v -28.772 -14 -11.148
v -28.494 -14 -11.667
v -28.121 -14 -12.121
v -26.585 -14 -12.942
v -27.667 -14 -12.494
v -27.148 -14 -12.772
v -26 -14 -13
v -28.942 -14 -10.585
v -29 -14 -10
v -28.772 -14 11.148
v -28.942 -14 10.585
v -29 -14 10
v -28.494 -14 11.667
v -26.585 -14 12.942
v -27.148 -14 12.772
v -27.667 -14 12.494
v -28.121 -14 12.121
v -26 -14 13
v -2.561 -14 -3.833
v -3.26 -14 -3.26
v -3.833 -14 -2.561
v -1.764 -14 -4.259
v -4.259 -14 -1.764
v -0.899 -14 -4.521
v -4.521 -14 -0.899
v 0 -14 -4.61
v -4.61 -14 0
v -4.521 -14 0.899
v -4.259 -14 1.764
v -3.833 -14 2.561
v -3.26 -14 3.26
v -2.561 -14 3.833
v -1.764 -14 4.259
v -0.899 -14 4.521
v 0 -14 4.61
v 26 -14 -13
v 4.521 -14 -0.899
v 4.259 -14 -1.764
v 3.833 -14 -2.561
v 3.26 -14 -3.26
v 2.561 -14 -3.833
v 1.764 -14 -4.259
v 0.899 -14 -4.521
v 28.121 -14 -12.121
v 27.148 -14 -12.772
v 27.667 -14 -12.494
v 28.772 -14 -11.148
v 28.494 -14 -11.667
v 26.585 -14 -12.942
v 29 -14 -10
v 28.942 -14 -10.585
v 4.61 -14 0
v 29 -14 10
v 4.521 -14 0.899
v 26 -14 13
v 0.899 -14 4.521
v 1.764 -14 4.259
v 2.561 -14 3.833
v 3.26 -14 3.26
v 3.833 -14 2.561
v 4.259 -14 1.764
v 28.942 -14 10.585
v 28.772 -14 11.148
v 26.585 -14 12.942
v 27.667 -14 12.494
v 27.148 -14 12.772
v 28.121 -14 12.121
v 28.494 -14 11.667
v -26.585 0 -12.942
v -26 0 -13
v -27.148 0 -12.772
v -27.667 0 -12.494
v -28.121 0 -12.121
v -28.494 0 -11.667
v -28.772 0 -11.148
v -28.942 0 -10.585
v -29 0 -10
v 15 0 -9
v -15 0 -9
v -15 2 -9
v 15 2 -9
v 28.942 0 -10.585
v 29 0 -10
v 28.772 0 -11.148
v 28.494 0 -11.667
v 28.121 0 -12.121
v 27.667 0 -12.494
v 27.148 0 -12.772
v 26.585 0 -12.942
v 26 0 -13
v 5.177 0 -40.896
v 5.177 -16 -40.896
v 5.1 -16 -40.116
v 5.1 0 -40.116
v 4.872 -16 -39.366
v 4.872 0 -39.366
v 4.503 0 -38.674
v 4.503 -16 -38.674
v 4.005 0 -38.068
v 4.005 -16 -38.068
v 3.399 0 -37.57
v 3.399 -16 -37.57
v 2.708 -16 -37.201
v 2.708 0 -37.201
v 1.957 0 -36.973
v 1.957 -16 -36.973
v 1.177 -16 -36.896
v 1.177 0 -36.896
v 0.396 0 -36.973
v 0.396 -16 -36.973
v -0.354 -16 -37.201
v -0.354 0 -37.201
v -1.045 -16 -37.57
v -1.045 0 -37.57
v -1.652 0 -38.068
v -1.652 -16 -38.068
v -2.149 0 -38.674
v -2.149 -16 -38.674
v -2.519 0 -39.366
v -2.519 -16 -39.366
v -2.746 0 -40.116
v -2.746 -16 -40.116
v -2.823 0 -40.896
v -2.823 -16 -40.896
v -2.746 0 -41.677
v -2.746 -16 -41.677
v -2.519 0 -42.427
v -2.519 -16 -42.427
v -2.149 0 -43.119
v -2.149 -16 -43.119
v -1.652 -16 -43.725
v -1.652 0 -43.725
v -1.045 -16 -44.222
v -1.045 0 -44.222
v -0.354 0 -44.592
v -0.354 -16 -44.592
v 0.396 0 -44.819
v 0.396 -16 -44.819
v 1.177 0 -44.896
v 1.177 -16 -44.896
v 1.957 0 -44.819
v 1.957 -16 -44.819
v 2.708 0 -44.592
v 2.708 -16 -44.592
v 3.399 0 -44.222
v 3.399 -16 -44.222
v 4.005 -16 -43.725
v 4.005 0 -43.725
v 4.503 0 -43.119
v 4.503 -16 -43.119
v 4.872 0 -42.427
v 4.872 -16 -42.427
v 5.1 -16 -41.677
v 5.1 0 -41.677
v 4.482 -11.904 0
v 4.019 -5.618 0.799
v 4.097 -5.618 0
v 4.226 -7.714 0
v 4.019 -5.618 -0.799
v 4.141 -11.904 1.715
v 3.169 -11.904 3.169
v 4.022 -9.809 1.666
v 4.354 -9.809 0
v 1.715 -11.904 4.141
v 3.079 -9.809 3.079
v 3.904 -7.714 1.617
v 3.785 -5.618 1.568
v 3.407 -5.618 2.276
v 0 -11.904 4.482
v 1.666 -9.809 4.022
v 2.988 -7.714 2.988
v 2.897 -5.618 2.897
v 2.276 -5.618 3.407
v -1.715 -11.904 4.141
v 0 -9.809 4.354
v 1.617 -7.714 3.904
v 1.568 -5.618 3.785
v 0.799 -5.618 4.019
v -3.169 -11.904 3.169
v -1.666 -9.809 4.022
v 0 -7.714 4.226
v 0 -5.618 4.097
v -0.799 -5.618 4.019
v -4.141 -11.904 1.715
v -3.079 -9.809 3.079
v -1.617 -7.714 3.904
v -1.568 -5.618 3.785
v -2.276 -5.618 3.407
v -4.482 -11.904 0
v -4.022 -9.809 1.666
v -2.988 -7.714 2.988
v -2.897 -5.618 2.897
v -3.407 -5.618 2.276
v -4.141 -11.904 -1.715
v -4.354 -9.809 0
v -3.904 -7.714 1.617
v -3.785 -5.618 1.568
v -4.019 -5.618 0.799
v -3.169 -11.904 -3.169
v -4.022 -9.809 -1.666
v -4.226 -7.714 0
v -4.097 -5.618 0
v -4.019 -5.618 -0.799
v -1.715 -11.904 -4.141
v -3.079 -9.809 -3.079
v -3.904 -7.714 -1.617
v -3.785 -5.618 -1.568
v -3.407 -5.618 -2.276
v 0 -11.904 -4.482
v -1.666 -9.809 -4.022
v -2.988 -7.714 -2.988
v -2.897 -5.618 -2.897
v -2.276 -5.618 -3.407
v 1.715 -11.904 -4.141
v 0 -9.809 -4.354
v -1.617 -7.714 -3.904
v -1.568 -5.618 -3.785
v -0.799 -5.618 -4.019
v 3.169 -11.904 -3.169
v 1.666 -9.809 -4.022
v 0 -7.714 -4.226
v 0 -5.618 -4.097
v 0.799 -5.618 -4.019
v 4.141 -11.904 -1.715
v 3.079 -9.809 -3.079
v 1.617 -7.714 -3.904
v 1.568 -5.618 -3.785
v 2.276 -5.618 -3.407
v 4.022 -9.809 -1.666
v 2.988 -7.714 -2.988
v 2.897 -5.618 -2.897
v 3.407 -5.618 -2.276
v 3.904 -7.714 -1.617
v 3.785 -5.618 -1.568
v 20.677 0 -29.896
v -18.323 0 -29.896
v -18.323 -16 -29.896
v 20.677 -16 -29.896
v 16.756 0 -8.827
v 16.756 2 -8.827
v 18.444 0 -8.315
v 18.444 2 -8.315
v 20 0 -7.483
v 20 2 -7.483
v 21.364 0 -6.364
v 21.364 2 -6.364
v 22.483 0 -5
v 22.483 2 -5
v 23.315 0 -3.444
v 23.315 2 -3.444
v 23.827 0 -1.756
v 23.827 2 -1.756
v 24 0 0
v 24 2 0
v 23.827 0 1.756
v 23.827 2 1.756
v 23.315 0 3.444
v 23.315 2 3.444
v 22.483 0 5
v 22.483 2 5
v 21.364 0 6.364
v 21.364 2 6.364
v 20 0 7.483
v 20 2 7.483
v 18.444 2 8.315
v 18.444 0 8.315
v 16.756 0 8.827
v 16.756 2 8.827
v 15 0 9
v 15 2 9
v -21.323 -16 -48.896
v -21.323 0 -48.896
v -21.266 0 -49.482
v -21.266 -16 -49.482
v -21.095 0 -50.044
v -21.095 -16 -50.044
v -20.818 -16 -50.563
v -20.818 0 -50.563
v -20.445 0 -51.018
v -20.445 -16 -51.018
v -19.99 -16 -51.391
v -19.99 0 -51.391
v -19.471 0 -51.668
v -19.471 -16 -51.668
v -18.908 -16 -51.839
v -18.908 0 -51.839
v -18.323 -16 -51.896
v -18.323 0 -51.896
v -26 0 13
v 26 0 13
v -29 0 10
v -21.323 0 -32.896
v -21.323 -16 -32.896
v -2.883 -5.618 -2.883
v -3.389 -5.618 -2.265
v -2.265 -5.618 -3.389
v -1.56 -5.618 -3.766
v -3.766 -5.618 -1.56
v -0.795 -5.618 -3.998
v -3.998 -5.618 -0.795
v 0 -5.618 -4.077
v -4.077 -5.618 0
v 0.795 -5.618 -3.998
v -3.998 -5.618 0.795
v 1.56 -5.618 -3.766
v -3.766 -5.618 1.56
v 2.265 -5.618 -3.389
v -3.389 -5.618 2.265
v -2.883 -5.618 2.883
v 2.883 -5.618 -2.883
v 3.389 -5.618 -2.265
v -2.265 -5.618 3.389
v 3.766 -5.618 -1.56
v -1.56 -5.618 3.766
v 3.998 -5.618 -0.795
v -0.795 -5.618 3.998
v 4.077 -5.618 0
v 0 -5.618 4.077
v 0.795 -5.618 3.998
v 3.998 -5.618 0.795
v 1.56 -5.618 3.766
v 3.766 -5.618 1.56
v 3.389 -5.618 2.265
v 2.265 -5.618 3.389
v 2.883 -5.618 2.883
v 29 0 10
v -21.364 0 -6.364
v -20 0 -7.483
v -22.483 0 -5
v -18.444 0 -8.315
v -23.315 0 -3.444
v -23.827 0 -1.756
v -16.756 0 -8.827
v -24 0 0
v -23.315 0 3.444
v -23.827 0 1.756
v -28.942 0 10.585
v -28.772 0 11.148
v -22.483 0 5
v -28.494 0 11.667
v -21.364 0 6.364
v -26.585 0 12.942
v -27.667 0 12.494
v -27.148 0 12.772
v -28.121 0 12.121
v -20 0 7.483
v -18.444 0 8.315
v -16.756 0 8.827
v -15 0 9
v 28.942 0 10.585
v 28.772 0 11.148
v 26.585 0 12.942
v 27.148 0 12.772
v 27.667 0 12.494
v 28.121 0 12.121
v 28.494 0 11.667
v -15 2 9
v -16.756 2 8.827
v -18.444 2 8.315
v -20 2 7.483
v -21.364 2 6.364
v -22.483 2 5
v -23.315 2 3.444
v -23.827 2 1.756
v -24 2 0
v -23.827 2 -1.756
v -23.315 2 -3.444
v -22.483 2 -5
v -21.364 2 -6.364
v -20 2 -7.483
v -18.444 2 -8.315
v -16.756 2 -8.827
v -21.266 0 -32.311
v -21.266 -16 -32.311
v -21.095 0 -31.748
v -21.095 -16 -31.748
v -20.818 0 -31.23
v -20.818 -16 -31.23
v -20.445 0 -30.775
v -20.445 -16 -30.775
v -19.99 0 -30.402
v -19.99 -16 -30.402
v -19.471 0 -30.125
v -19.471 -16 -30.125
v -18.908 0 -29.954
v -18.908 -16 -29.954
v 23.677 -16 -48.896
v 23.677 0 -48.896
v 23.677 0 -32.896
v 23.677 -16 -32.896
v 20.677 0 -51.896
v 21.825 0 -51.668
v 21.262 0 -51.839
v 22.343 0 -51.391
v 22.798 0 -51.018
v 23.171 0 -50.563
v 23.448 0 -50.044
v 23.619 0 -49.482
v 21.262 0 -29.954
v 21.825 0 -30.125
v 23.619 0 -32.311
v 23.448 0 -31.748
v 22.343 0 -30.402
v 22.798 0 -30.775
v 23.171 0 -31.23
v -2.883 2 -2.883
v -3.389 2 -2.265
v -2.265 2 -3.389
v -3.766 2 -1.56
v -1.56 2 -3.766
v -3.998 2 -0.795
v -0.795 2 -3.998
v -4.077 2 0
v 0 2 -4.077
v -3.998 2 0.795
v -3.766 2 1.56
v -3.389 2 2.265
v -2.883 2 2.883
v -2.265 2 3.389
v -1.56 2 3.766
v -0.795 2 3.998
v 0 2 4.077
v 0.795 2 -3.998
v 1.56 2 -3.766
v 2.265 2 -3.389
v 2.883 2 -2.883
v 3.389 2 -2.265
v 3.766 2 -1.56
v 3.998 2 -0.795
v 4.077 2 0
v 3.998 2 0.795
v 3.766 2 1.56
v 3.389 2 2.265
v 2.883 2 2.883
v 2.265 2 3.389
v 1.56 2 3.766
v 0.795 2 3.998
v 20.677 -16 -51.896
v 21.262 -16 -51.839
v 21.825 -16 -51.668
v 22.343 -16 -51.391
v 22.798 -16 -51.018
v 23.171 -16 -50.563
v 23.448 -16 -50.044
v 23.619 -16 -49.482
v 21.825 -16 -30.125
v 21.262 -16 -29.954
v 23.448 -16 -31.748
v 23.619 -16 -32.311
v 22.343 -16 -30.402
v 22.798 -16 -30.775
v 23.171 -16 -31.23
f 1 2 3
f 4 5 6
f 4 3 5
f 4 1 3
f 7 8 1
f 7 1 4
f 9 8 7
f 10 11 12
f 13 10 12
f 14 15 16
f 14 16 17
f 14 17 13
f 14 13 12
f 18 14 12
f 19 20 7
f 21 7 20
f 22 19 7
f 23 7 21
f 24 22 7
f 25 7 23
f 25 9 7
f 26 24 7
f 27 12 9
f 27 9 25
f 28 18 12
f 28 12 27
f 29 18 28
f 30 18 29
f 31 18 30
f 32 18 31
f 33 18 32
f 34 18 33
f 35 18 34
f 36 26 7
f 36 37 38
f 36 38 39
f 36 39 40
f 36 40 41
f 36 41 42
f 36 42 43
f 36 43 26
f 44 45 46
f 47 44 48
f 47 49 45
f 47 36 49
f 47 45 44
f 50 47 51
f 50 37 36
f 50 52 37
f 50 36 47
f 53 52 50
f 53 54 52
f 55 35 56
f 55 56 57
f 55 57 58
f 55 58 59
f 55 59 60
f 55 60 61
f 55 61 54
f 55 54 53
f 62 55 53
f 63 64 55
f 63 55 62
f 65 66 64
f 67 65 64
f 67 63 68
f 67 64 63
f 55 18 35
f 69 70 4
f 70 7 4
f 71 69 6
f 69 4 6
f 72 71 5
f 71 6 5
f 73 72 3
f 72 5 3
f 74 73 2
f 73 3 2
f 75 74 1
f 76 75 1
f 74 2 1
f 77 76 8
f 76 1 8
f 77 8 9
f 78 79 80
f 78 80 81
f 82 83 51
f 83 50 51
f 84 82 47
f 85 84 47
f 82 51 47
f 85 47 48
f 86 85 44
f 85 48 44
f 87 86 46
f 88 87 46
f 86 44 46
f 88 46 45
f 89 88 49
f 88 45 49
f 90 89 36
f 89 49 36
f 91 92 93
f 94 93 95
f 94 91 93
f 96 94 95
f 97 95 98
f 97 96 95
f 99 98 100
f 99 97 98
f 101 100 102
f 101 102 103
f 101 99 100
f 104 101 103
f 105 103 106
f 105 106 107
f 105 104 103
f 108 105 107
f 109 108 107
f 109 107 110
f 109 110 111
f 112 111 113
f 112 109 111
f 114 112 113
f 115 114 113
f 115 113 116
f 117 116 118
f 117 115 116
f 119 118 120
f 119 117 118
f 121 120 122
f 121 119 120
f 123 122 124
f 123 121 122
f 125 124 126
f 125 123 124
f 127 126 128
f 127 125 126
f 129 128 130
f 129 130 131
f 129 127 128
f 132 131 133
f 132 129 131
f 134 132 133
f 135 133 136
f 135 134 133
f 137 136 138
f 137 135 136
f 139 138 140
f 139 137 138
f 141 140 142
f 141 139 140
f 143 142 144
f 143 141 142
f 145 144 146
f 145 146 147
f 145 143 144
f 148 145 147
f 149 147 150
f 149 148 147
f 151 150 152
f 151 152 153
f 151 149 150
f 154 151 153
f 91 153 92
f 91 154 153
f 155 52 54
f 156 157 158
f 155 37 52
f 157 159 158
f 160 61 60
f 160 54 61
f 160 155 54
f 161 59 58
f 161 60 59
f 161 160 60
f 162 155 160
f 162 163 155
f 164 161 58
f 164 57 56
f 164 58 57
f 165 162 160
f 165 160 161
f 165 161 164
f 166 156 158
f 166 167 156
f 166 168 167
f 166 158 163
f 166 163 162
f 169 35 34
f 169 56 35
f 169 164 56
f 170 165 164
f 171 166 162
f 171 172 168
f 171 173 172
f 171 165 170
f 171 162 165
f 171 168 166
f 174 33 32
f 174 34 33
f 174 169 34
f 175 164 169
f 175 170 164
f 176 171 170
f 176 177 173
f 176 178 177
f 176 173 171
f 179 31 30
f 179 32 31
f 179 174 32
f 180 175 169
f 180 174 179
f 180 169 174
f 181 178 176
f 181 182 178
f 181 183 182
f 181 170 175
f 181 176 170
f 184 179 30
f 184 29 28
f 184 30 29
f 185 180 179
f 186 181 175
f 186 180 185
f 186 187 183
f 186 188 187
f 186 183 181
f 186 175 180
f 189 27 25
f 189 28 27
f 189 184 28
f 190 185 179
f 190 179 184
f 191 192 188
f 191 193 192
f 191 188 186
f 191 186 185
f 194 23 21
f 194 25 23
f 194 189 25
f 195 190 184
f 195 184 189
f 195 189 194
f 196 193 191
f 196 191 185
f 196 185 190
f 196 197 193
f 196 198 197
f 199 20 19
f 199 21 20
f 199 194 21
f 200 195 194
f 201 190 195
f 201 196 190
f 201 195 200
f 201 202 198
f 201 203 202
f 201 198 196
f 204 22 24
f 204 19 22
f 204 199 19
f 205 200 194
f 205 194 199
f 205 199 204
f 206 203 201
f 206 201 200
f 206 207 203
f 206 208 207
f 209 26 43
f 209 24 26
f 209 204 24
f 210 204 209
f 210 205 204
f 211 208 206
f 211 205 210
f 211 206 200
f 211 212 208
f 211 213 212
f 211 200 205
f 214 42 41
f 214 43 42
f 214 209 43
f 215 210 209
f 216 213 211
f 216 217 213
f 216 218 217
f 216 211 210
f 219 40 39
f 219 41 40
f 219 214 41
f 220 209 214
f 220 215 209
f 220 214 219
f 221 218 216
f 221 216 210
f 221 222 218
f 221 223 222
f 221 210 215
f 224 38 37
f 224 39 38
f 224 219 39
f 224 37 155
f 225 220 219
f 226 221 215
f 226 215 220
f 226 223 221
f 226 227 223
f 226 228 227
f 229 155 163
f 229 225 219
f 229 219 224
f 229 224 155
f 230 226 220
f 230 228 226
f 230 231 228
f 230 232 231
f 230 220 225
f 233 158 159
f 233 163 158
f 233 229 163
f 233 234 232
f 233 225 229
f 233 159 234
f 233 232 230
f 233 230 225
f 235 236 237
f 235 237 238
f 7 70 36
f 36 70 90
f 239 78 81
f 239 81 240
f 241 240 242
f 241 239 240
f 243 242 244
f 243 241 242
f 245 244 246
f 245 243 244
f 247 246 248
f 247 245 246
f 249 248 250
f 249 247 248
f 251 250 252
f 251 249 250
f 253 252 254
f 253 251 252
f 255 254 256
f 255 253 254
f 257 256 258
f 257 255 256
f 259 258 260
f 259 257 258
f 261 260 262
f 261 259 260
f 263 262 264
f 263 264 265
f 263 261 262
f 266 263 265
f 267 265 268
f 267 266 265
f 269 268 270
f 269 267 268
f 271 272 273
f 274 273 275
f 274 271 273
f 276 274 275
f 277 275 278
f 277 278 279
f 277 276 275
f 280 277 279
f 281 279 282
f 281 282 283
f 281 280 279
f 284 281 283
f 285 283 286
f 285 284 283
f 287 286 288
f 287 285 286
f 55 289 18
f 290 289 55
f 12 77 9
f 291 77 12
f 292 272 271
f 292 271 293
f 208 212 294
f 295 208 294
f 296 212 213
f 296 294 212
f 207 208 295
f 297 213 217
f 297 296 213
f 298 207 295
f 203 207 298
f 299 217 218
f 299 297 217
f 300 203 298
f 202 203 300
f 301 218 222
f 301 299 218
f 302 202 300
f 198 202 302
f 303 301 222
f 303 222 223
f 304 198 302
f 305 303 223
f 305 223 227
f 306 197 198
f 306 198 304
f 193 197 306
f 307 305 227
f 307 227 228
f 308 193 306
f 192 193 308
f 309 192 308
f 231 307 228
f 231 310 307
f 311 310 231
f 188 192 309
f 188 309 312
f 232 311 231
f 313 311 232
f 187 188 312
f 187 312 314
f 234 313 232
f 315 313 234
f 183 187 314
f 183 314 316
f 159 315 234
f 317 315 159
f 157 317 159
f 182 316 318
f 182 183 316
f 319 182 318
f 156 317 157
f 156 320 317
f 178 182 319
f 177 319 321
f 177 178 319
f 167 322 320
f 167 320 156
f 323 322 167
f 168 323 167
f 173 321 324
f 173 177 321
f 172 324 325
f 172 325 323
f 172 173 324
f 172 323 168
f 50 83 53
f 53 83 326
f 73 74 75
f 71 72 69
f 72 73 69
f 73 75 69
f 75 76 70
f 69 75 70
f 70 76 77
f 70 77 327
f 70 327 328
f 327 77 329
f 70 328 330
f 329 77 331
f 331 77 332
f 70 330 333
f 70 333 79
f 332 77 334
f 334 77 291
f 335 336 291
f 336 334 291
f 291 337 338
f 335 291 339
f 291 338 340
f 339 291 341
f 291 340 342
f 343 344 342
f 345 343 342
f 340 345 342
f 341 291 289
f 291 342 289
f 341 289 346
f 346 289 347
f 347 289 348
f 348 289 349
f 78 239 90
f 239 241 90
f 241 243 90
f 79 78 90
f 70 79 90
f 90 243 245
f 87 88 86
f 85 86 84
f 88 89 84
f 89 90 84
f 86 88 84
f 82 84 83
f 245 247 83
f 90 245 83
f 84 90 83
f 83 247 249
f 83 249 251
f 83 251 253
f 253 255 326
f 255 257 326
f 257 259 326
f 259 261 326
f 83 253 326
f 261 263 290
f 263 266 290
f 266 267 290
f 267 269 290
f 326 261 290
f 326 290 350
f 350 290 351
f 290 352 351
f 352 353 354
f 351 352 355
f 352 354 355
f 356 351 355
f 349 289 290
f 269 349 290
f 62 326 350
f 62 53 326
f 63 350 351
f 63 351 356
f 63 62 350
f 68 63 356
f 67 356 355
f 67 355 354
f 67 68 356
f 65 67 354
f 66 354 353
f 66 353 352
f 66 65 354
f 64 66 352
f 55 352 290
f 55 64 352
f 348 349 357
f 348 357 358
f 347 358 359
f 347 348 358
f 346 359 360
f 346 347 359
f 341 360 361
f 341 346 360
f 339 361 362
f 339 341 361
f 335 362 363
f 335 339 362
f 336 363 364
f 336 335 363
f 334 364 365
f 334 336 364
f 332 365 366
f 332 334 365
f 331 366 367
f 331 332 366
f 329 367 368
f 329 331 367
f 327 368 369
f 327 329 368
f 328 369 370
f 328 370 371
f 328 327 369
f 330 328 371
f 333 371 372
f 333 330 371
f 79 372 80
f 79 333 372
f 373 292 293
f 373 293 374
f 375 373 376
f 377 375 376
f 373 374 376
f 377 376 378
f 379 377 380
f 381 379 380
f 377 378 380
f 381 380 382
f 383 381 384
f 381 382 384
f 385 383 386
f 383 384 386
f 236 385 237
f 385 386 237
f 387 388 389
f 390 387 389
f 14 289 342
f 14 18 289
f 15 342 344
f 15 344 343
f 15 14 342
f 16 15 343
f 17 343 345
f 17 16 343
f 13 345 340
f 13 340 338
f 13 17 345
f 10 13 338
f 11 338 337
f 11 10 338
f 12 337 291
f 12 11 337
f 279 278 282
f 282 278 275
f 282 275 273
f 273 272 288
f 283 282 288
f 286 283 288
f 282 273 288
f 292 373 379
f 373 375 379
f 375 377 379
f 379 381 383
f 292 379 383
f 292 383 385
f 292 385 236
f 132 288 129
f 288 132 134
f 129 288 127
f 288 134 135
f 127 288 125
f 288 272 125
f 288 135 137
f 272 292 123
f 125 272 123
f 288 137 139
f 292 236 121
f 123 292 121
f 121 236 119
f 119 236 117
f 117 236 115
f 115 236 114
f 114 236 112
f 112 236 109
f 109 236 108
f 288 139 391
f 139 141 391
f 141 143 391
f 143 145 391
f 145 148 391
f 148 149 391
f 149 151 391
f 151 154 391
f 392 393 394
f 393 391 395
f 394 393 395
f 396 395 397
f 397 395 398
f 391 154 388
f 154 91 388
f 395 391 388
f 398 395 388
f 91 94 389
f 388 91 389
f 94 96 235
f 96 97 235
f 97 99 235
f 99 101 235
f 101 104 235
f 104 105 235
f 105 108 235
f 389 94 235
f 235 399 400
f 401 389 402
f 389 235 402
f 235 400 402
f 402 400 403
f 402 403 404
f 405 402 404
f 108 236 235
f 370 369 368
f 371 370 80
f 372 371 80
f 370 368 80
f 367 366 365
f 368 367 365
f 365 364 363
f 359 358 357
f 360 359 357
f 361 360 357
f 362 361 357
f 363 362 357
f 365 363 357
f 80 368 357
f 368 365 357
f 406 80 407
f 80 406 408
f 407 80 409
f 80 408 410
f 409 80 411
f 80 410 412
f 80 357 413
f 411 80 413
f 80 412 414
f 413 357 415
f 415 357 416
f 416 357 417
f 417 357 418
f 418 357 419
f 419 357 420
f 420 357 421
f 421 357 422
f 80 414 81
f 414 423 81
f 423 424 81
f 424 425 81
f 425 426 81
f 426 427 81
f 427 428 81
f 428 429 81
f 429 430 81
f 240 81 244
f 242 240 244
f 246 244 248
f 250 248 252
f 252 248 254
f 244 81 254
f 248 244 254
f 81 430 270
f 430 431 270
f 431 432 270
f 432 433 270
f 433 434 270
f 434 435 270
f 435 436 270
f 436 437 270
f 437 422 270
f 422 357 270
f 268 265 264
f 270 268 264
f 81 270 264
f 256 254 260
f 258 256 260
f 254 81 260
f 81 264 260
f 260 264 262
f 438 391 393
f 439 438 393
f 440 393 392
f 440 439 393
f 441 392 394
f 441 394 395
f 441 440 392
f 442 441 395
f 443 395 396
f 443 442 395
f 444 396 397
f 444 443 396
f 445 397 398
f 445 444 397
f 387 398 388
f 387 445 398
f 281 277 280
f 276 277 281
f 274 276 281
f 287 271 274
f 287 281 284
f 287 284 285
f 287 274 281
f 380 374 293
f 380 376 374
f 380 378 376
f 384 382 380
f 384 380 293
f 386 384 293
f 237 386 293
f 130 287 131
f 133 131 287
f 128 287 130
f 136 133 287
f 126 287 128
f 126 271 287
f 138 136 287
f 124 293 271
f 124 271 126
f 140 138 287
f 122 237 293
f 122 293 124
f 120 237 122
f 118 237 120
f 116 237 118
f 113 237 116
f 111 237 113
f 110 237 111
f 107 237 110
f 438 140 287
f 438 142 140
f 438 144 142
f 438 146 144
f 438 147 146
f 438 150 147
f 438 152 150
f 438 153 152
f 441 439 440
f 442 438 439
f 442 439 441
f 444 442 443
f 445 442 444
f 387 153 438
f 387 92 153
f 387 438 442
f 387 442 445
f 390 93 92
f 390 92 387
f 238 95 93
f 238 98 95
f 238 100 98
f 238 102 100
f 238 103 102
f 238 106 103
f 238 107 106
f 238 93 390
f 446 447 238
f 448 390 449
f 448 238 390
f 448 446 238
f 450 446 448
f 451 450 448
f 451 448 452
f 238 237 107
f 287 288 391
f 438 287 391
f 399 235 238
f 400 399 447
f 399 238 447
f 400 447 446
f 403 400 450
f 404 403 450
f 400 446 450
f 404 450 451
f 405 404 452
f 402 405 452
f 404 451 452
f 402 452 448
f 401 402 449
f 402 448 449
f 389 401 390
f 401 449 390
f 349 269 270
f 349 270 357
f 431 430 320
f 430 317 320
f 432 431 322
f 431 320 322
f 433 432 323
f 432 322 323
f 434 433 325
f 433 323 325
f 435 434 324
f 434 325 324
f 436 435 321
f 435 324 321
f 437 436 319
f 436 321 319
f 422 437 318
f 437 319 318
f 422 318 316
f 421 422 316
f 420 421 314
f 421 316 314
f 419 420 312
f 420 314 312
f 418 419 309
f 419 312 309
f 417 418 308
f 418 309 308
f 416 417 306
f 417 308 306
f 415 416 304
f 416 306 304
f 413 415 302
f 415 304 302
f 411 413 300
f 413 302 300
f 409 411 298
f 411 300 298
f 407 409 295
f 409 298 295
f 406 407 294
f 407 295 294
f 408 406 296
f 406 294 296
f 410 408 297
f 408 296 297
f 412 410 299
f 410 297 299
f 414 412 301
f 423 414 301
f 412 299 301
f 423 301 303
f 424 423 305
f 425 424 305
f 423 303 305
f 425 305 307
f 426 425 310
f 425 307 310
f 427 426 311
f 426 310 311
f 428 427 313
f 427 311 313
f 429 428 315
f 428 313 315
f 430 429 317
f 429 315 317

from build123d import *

# Parameters (mm, degrees)
F0_W     = 58
F0_H     = 26
F0_R     = 4.0765
F1_DEPTH = 14
F2_DEPTH = 2
F3_R     = 4.61
F3_R_2   = 4.0765
F4_DEPTH = 8.382
F4_TAPER = 3.5
F5_R     = 3
F6_W     = 45
F6_H     = 22
F6_R     = 4
F7_DEPTH = 16
F8_R     = 3


with BuildPart() as f1:
    # F0 (on Front) → F1 (new body)
    with BuildSketch(Plane.XZ):
        Rectangle(F0_W, F0_H)
        with BuildLine():
            ThreePointArc((-15, -9), (-24, 0), (-15, 9))
            Line((-15, 9), (15, 9))
            ThreePointArc((15, 9), (24, 0), (15, -9))
            Line((15, -9), (-15, -9))
        make_face(mode=Mode.SUBTRACT)
        with BuildLine():
            Line((15, 9), (-15, 9))
            ThreePointArc((-15, 9), (-24, 0), (-15, -9))
            Line((-15, -9), (15, -9))
            ThreePointArc((15, -9), (24, 0), (15, 9))
        make_face()
        Circle(F0_R, mode=Mode.SUBTRACT)
    extrude(amount=F1_DEPTH)

    # F0 (on Front) → F2 (join)
    with BuildSketch(Plane.XZ):
        with BuildLine():
            Line((15, 9), (-15, 9))
            ThreePointArc((-15, 9), (-24, 0), (-15, -9))
            Line((-15, -9), (15, -9))
            ThreePointArc((15, -9), (24, 0), (15, 9))
        make_face()
        Circle(F0_R, mode=Mode.SUBTRACT)
    extrude(amount=-F2_DEPTH)

    # F3 (on face) → F4 (cut)
    with BuildSketch(Plane.XZ.offset(14)):
        Circle(F3_R)
        Circle(F3_R_2, mode=Mode.SUBTRACT)
        Circle(F3_R_2)
    extrude(amount=-F4_DEPTH, taper=F4_TAPER, mode=Mode.SUBTRACT)

    # F5
    f5_edges = [f1.edges().sort_by_distance(p)[0] for p in [
        (29, -7, 13),
        (29, -7, -13),
        (-29, -7, 13),
        (-29, -7, -13),
    ]]
    fillet(f5_edges, radius=F5_R)


with BuildPart() as f7:
    # F6 (on Front) → F7 (new body)
    with BuildSketch(Plane.XZ):
        with Locations((1.1767878896, -40.8962557654)):
            Rectangle(F6_W, F6_H)
        with Locations((1.1767878896, -40.8962557654)):
            Circle(F6_R, mode=Mode.SUBTRACT)
    extrude(amount=F7_DEPTH)

    # F8
    f8_edges = [f7.edges().sort_by_distance(p)[0] for p in [
        (23.676788, -8, -29.896256),
        (23.676788, -8, -51.896256),
        (-21.323212, -8, -29.896256),
        (-21.323212, -8, -51.896256),
    ]]
    fillet(f8_edges, radius=F8_R)


solid = Compound([f1.part, f7.part])
